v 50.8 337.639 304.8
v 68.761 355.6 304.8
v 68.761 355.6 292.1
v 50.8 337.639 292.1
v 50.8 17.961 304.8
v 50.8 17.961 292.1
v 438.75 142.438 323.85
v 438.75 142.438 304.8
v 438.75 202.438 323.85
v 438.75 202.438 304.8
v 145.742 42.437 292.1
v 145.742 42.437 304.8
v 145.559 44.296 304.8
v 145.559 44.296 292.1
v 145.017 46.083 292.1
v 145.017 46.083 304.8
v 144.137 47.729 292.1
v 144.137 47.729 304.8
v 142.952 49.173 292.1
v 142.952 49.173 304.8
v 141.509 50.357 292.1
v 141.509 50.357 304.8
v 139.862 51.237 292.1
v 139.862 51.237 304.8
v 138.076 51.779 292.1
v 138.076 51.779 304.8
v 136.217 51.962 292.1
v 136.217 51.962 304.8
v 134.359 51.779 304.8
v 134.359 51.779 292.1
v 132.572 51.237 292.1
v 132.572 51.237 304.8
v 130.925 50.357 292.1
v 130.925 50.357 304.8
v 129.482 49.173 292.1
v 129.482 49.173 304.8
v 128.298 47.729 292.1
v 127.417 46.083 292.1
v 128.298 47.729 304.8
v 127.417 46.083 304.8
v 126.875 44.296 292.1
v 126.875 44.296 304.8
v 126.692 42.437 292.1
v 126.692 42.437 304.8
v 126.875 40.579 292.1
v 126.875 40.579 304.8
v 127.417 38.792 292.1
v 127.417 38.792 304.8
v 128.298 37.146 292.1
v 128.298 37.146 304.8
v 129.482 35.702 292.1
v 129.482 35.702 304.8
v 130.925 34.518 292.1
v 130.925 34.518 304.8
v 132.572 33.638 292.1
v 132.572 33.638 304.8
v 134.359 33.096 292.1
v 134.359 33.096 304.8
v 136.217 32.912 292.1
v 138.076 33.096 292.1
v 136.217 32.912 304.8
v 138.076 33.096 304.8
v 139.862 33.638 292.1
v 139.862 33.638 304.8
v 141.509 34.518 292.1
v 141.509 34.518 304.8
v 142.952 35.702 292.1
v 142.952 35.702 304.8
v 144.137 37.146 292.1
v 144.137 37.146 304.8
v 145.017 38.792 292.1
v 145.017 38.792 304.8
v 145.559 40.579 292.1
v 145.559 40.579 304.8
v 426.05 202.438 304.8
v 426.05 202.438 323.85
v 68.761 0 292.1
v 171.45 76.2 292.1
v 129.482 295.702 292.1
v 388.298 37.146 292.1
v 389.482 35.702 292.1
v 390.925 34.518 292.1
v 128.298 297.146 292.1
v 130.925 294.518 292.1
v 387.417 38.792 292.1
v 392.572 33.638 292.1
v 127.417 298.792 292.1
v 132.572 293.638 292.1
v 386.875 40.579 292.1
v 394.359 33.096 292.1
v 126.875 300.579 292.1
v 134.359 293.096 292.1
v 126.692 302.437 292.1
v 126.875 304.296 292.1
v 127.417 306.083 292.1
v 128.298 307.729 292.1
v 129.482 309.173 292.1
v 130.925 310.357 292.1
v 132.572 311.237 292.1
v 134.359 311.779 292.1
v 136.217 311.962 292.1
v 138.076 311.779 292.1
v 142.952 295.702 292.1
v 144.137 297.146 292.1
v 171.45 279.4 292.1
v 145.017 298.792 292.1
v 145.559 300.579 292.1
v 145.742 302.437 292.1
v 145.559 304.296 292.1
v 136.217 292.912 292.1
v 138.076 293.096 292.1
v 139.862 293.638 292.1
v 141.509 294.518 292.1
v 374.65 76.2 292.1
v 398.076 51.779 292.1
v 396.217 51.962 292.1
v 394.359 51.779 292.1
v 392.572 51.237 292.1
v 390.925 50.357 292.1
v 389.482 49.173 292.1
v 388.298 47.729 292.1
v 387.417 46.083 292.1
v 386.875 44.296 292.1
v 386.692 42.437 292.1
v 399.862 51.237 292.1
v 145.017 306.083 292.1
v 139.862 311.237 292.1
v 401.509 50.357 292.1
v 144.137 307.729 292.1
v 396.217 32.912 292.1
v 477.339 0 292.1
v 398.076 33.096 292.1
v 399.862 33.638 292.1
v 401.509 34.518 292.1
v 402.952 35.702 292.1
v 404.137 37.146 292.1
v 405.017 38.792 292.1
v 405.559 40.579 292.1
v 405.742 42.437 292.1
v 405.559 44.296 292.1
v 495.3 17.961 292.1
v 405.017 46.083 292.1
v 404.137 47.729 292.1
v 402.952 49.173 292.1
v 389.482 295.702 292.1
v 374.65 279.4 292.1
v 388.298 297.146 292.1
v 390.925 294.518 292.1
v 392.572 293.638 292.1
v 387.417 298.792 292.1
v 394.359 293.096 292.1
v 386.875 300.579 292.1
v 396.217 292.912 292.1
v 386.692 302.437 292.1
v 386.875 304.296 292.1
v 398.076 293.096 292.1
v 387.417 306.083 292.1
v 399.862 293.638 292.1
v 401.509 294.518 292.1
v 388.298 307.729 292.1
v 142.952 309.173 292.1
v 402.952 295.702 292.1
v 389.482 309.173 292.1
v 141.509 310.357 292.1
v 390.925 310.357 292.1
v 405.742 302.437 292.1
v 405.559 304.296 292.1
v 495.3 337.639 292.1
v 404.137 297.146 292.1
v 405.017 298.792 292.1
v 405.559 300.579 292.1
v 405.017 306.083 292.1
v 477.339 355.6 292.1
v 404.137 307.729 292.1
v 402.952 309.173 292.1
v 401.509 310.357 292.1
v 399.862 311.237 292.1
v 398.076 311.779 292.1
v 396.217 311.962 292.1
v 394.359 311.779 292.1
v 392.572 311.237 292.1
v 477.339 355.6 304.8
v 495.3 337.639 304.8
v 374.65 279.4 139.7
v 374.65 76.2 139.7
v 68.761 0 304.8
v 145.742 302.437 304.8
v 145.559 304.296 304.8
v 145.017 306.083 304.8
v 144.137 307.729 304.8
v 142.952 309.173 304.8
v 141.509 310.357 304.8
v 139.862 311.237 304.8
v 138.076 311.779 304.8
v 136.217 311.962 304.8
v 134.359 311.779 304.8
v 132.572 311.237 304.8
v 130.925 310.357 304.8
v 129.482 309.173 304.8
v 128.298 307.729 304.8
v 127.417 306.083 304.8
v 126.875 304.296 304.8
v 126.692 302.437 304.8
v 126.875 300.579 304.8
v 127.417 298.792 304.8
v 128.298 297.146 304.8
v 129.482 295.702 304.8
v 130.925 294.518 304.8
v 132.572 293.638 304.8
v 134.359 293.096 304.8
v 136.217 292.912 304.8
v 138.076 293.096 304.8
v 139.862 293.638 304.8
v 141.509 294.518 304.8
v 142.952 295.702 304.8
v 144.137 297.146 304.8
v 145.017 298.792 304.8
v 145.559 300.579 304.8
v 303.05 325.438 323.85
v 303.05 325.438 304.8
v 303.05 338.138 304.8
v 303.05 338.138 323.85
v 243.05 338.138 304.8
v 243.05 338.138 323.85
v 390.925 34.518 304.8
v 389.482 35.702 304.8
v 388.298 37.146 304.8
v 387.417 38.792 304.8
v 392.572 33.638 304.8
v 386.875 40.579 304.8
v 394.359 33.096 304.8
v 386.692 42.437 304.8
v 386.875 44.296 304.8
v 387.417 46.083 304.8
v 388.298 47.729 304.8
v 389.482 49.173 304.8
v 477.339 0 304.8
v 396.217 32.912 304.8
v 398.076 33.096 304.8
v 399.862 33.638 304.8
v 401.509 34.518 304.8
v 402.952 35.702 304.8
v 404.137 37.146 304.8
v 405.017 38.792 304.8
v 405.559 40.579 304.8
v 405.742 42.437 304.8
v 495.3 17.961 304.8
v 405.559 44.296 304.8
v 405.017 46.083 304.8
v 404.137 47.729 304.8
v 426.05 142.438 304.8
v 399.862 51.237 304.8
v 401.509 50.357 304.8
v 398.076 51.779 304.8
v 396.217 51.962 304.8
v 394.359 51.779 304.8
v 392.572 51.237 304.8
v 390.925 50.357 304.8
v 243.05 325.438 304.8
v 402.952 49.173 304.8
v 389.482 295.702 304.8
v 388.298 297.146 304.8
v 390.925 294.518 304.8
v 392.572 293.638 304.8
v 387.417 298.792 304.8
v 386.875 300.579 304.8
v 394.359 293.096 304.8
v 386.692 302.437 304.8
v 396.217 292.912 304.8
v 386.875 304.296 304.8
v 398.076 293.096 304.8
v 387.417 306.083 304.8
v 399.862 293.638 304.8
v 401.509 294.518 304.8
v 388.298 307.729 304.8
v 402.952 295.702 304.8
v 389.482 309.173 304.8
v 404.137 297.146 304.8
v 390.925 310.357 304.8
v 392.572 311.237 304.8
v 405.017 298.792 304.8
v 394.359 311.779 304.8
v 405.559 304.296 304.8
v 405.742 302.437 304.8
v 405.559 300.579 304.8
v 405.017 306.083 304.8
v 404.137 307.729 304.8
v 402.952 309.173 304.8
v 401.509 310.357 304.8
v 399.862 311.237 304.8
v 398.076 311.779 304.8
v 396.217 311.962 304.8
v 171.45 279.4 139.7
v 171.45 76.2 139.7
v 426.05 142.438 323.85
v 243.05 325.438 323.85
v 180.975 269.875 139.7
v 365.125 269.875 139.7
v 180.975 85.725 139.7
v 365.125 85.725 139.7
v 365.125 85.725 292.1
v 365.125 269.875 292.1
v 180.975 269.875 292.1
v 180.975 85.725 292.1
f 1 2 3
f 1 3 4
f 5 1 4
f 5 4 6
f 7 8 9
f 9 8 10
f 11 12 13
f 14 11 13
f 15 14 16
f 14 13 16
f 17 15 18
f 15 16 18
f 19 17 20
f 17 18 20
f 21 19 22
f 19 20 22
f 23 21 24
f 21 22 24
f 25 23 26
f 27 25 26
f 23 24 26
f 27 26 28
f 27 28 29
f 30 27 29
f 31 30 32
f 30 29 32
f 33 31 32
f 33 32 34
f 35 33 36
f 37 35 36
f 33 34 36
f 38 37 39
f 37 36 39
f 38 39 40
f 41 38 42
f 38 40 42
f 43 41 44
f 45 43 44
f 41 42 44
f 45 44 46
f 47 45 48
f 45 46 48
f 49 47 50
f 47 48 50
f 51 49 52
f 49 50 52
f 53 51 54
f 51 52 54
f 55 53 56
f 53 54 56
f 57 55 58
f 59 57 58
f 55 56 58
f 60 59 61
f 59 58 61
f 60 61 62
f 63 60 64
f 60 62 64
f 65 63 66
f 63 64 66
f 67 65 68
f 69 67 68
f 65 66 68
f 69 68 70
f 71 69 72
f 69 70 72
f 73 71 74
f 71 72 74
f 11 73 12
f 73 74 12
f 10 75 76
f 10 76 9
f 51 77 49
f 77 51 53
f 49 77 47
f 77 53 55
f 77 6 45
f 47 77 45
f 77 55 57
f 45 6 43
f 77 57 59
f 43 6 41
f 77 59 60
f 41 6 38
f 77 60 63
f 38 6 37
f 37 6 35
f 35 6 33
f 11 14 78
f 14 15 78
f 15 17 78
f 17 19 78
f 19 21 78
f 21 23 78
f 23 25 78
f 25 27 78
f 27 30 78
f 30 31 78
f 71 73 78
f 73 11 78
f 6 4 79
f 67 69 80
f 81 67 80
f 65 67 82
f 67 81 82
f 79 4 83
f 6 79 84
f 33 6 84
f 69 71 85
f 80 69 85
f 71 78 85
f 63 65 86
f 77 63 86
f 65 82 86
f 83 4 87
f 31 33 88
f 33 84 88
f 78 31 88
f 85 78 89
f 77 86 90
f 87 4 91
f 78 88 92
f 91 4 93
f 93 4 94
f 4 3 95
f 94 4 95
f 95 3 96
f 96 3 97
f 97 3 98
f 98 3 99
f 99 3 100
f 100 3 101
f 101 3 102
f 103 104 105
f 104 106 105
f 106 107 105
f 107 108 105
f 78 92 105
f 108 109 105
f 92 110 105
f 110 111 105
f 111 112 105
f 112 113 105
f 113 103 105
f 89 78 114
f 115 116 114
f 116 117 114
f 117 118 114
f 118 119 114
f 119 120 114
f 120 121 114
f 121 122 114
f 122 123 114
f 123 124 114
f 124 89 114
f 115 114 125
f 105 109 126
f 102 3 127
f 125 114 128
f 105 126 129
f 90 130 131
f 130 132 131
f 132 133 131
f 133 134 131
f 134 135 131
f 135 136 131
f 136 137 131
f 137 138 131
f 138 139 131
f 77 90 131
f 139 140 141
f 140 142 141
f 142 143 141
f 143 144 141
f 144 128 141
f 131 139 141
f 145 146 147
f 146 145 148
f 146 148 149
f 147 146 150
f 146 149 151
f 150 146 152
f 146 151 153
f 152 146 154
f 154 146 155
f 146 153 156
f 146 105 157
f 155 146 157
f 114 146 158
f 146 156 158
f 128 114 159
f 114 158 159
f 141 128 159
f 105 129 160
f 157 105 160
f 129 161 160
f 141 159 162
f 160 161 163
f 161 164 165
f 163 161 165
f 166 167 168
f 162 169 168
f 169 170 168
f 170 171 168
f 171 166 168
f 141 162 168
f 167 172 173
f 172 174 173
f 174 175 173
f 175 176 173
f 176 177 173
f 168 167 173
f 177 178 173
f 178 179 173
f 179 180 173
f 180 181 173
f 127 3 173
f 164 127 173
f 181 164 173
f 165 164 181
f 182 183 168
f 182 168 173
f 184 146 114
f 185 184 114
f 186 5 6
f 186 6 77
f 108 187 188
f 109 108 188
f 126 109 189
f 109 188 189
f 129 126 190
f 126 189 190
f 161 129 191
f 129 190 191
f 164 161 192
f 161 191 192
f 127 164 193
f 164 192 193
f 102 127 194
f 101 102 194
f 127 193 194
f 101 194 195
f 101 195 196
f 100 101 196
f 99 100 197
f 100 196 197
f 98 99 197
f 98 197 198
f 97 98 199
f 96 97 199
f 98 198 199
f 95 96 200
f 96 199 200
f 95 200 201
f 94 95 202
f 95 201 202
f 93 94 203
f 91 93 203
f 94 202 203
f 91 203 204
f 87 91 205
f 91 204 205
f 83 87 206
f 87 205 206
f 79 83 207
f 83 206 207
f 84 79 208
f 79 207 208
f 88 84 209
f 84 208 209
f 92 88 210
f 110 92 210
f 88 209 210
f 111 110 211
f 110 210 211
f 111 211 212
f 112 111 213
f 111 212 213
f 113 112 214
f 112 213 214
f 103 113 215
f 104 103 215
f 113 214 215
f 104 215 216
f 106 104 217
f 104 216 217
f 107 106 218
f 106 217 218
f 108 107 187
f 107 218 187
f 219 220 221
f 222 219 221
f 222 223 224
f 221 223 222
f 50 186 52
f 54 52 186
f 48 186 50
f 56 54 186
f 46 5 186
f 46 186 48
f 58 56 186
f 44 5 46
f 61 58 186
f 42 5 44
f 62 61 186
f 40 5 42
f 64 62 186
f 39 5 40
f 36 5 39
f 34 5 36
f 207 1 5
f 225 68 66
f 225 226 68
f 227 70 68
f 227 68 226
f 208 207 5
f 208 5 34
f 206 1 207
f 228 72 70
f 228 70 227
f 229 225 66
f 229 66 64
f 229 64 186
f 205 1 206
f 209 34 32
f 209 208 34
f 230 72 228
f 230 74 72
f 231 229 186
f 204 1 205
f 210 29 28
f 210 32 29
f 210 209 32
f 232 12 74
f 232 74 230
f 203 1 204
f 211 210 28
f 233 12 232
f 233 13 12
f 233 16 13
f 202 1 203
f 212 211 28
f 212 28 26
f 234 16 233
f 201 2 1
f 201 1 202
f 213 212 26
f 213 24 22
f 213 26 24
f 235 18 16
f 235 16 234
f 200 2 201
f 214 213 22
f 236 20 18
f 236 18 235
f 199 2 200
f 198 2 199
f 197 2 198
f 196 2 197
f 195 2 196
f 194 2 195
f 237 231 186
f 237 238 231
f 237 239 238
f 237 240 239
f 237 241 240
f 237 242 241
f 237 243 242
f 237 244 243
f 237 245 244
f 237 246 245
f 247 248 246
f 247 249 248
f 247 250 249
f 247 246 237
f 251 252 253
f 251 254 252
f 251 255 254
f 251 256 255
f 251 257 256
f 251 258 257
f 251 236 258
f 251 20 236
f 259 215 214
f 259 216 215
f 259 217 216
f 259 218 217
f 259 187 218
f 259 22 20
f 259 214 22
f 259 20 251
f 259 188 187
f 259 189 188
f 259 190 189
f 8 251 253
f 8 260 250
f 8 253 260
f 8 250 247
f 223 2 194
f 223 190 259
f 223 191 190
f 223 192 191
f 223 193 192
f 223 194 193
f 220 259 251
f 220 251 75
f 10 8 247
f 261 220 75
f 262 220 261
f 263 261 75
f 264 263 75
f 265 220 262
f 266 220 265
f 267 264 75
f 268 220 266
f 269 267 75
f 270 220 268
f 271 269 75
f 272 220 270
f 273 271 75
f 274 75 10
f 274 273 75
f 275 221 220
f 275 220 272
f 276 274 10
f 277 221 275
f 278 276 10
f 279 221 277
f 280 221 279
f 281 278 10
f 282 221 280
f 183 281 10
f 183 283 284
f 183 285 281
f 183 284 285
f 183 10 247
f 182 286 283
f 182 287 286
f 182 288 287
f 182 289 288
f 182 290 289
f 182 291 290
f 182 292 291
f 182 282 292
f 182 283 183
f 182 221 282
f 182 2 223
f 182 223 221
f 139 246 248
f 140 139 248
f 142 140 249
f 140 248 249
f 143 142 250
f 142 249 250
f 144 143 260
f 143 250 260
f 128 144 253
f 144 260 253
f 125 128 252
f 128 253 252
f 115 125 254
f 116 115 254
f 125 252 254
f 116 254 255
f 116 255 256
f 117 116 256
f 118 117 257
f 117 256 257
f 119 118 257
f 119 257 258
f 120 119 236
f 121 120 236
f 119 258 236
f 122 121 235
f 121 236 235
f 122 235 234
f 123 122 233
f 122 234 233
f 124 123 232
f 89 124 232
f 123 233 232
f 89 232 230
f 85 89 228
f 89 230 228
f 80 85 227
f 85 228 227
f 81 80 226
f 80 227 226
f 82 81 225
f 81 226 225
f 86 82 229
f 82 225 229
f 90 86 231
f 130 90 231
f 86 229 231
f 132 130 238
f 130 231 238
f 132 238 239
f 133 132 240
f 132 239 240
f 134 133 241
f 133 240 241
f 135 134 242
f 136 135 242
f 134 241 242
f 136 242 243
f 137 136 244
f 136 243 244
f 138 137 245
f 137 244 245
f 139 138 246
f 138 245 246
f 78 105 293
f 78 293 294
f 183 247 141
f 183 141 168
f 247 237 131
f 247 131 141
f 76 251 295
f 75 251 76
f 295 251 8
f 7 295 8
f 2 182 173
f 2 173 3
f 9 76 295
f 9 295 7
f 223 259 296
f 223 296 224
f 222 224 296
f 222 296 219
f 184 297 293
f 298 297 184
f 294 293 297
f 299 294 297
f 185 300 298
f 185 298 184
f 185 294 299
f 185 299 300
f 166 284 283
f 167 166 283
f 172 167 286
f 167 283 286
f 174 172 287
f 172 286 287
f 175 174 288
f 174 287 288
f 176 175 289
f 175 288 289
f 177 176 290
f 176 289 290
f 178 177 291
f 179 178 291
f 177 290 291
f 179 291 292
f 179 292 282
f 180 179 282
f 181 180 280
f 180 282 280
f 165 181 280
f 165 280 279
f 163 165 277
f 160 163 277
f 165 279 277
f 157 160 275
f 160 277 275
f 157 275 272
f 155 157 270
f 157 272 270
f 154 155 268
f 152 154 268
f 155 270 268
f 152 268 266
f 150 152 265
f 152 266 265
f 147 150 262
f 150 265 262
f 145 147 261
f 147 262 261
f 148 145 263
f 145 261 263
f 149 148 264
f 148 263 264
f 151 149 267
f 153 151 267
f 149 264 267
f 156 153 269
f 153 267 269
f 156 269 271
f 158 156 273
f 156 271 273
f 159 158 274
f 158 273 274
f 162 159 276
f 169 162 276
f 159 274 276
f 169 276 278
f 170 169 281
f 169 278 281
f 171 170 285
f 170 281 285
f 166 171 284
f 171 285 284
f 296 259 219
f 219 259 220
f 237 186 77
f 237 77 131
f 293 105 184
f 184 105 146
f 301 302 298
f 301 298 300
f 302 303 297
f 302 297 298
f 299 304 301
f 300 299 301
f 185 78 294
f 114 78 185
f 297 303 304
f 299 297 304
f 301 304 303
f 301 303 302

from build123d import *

# Parameters (mm, degrees)
F2_DEPTH = 12.7
F3_R     = 9.525
F4_DEPTH = 12.7
F5_W     = 60
F5_H     = 12.7
F5_W_2   = 12.7
F5_H_2   = 60
F6_DEPTH = 19.05
F7_W     = 203.2
F7_H     = 203.2
F7_W_2   = 184.15
F7_H_2   = 184.15
F8_DEPTH = 152.4


with BuildPart() as f2:
    # F1 (on offset) → F2 (new body)
    with BuildSketch(Plane.XY.offset(304.8)):
        Polygon((50.8, 17.960512), (68.760512, 0), (477.339488, 0), (495.3, 17.960512), (495.3, 337.639488), (477.339488, 355.6), (68.760512, 355.6), (50.8, 337.639488), align=None)
    extrude(amount=-F2_DEPTH)

    # F3 (on face) → F4 (cut)
    with BuildSketch(Plane.XY.offset(304.8)):
        with Locations((396.217286, 302.437495)):
            Circle(F3_R)
        with Locations((396.217286, 42.437495)):
            Circle(F3_R)
        with Locations((136.217286, 302.437495)):
            Circle(F3_R)
        with Locations((136.217286, 42.437495)):
            Circle(F3_R)
    extrude(amount=-F4_DEPTH, mode=Mode.SUBTRACT)

    # F5 (on face) → F6 (join)
    with BuildSketch(Plane.XY.offset(304.8)):
        with Locations((273.05, 331.7875)):
            Rectangle(F5_W, F5_H)
        with Locations((432.4, 172.4375)):
            Rectangle(F5_W_2, F5_H_2)
    extrude(amount=F6_DEPTH)

    # F7 (on face) → F8 (join)
    with BuildSketch(Plane(origin=(0, 0, 292.1), x_dir=(1, 0, 0), z_dir=(0, 0, -1))):
        with Locations((273.05, -177.8)):
            Rectangle(F7_W, F7_H)
        with Locations((273.05, -177.8)):
            Rectangle(F7_W_2, F7_H_2, mode=Mode.SUBTRACT)
    extrude(amount=F8_DEPTH)


solid = f2.part
